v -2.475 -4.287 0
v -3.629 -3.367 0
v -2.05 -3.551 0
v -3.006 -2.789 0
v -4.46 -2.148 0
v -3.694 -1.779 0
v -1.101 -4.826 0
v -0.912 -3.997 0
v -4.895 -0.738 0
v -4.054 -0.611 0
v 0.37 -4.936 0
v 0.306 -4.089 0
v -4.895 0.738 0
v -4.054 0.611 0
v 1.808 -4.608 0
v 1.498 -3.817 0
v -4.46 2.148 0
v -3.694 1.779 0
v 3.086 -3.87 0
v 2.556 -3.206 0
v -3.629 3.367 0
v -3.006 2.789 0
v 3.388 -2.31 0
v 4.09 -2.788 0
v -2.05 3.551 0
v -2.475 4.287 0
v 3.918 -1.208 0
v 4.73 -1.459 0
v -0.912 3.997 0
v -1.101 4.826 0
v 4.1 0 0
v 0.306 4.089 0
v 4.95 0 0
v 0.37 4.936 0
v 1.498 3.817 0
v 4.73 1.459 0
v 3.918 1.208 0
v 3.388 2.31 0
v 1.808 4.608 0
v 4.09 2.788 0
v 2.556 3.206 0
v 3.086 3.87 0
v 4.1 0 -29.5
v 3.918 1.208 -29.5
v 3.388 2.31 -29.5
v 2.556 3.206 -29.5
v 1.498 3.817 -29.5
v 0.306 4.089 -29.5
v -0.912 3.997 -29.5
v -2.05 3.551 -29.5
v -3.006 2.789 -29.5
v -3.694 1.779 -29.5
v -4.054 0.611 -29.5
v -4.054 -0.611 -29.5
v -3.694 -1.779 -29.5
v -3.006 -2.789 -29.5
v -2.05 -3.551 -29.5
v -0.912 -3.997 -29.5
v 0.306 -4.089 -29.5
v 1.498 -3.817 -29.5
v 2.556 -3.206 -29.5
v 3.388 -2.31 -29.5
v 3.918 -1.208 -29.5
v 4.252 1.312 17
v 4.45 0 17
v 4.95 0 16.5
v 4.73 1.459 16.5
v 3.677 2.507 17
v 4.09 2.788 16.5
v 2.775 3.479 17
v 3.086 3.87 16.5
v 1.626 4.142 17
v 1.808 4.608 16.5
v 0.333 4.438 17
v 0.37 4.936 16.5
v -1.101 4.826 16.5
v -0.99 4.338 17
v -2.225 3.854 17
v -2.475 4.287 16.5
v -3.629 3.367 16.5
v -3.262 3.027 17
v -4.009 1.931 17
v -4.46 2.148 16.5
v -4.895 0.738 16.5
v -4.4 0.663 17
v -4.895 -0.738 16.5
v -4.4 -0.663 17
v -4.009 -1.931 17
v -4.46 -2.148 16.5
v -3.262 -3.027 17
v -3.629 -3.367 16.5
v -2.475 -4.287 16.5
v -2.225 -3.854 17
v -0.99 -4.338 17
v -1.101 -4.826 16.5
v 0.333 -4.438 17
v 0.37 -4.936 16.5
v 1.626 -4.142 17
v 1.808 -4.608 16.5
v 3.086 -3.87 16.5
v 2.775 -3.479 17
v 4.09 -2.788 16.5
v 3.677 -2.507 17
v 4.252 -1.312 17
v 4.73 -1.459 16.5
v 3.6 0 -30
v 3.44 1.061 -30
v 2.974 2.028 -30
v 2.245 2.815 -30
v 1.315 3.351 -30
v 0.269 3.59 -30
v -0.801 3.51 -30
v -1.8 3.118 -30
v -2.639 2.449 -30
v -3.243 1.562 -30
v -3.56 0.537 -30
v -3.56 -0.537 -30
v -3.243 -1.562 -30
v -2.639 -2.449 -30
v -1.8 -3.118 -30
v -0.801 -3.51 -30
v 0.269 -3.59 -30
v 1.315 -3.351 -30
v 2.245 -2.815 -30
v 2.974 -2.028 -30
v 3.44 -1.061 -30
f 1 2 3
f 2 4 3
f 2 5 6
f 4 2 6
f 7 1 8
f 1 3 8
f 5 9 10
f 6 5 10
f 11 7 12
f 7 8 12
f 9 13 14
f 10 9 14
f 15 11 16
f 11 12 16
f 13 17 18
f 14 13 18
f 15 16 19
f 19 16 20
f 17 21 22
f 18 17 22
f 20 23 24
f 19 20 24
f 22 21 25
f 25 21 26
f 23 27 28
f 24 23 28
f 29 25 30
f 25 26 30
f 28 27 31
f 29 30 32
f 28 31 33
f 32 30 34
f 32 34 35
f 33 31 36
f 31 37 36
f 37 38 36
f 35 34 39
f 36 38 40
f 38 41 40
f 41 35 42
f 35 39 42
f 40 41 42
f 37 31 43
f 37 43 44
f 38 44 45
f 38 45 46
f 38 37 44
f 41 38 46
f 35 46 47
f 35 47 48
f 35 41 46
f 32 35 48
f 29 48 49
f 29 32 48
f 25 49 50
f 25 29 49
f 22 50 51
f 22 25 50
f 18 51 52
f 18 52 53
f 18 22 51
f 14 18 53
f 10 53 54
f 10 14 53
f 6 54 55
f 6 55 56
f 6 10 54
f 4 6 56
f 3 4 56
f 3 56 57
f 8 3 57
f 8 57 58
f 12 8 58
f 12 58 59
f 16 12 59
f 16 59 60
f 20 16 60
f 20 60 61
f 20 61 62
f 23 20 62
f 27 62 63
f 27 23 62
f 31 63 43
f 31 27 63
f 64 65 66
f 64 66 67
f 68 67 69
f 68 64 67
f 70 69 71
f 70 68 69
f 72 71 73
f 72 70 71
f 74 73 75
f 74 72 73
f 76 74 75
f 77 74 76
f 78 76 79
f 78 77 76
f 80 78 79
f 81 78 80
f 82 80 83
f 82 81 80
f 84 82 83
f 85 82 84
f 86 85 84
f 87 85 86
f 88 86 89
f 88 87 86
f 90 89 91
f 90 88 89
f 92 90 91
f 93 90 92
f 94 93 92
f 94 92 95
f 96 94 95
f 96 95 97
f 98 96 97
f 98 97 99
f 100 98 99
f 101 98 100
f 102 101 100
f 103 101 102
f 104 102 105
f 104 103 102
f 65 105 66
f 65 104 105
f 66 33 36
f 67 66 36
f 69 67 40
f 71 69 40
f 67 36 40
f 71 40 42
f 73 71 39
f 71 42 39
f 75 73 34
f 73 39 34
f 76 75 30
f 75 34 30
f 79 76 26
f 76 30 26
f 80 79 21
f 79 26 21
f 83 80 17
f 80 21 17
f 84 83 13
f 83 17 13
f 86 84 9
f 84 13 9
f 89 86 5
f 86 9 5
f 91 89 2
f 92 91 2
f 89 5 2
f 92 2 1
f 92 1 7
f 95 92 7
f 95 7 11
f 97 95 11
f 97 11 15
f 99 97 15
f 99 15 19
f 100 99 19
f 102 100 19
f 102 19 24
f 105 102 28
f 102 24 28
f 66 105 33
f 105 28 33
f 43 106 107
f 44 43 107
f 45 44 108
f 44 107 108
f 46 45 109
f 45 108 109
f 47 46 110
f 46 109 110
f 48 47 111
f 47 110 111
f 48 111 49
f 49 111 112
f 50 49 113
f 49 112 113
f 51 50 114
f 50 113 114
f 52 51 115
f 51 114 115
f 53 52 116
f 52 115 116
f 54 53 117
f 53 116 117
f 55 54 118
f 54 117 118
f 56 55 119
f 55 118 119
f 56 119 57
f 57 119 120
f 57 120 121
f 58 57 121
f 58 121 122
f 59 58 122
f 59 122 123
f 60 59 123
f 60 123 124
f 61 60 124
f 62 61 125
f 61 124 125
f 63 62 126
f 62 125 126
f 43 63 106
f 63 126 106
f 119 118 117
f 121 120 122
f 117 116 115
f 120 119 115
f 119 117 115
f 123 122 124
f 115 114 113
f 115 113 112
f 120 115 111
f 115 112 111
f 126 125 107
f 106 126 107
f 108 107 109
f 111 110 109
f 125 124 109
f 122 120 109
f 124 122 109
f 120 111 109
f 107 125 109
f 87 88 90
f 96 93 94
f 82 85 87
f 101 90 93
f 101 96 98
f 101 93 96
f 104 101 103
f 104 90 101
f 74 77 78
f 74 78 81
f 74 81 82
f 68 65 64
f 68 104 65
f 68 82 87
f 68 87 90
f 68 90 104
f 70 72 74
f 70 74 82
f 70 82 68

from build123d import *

# Parameters (mm, degrees)
F0_R     = 4.95
F0_R_2   = 4.1
F1_DEPTH = 17
F2_DEPTH = 30
F3_SIZE  = 0.5


with BuildPart() as f1:
    # F0 (on Top) → F1 (new body)
    with BuildSketch(Plane.XY):
        Circle(F0_R)
        Circle(F0_R_2, mode=Mode.SUBTRACT)
        Circle(F0_R_2)
    extrude(amount=F1_DEPTH)

    # F0 (on Top) → F2 (join)
    with BuildSketch(Plane.XY):
        Circle(F0_R_2)
    extrude(amount=-F2_DEPTH)

    # F3
    f3_edges = [f1.edges().sort_by_distance(p)[0] for p in [
        (-4.95, 0, 17),
        (-4.1, 0, -30),
    ]]
    chamfer(f3_edges, length=F3_SIZE)


solid = f1.part
